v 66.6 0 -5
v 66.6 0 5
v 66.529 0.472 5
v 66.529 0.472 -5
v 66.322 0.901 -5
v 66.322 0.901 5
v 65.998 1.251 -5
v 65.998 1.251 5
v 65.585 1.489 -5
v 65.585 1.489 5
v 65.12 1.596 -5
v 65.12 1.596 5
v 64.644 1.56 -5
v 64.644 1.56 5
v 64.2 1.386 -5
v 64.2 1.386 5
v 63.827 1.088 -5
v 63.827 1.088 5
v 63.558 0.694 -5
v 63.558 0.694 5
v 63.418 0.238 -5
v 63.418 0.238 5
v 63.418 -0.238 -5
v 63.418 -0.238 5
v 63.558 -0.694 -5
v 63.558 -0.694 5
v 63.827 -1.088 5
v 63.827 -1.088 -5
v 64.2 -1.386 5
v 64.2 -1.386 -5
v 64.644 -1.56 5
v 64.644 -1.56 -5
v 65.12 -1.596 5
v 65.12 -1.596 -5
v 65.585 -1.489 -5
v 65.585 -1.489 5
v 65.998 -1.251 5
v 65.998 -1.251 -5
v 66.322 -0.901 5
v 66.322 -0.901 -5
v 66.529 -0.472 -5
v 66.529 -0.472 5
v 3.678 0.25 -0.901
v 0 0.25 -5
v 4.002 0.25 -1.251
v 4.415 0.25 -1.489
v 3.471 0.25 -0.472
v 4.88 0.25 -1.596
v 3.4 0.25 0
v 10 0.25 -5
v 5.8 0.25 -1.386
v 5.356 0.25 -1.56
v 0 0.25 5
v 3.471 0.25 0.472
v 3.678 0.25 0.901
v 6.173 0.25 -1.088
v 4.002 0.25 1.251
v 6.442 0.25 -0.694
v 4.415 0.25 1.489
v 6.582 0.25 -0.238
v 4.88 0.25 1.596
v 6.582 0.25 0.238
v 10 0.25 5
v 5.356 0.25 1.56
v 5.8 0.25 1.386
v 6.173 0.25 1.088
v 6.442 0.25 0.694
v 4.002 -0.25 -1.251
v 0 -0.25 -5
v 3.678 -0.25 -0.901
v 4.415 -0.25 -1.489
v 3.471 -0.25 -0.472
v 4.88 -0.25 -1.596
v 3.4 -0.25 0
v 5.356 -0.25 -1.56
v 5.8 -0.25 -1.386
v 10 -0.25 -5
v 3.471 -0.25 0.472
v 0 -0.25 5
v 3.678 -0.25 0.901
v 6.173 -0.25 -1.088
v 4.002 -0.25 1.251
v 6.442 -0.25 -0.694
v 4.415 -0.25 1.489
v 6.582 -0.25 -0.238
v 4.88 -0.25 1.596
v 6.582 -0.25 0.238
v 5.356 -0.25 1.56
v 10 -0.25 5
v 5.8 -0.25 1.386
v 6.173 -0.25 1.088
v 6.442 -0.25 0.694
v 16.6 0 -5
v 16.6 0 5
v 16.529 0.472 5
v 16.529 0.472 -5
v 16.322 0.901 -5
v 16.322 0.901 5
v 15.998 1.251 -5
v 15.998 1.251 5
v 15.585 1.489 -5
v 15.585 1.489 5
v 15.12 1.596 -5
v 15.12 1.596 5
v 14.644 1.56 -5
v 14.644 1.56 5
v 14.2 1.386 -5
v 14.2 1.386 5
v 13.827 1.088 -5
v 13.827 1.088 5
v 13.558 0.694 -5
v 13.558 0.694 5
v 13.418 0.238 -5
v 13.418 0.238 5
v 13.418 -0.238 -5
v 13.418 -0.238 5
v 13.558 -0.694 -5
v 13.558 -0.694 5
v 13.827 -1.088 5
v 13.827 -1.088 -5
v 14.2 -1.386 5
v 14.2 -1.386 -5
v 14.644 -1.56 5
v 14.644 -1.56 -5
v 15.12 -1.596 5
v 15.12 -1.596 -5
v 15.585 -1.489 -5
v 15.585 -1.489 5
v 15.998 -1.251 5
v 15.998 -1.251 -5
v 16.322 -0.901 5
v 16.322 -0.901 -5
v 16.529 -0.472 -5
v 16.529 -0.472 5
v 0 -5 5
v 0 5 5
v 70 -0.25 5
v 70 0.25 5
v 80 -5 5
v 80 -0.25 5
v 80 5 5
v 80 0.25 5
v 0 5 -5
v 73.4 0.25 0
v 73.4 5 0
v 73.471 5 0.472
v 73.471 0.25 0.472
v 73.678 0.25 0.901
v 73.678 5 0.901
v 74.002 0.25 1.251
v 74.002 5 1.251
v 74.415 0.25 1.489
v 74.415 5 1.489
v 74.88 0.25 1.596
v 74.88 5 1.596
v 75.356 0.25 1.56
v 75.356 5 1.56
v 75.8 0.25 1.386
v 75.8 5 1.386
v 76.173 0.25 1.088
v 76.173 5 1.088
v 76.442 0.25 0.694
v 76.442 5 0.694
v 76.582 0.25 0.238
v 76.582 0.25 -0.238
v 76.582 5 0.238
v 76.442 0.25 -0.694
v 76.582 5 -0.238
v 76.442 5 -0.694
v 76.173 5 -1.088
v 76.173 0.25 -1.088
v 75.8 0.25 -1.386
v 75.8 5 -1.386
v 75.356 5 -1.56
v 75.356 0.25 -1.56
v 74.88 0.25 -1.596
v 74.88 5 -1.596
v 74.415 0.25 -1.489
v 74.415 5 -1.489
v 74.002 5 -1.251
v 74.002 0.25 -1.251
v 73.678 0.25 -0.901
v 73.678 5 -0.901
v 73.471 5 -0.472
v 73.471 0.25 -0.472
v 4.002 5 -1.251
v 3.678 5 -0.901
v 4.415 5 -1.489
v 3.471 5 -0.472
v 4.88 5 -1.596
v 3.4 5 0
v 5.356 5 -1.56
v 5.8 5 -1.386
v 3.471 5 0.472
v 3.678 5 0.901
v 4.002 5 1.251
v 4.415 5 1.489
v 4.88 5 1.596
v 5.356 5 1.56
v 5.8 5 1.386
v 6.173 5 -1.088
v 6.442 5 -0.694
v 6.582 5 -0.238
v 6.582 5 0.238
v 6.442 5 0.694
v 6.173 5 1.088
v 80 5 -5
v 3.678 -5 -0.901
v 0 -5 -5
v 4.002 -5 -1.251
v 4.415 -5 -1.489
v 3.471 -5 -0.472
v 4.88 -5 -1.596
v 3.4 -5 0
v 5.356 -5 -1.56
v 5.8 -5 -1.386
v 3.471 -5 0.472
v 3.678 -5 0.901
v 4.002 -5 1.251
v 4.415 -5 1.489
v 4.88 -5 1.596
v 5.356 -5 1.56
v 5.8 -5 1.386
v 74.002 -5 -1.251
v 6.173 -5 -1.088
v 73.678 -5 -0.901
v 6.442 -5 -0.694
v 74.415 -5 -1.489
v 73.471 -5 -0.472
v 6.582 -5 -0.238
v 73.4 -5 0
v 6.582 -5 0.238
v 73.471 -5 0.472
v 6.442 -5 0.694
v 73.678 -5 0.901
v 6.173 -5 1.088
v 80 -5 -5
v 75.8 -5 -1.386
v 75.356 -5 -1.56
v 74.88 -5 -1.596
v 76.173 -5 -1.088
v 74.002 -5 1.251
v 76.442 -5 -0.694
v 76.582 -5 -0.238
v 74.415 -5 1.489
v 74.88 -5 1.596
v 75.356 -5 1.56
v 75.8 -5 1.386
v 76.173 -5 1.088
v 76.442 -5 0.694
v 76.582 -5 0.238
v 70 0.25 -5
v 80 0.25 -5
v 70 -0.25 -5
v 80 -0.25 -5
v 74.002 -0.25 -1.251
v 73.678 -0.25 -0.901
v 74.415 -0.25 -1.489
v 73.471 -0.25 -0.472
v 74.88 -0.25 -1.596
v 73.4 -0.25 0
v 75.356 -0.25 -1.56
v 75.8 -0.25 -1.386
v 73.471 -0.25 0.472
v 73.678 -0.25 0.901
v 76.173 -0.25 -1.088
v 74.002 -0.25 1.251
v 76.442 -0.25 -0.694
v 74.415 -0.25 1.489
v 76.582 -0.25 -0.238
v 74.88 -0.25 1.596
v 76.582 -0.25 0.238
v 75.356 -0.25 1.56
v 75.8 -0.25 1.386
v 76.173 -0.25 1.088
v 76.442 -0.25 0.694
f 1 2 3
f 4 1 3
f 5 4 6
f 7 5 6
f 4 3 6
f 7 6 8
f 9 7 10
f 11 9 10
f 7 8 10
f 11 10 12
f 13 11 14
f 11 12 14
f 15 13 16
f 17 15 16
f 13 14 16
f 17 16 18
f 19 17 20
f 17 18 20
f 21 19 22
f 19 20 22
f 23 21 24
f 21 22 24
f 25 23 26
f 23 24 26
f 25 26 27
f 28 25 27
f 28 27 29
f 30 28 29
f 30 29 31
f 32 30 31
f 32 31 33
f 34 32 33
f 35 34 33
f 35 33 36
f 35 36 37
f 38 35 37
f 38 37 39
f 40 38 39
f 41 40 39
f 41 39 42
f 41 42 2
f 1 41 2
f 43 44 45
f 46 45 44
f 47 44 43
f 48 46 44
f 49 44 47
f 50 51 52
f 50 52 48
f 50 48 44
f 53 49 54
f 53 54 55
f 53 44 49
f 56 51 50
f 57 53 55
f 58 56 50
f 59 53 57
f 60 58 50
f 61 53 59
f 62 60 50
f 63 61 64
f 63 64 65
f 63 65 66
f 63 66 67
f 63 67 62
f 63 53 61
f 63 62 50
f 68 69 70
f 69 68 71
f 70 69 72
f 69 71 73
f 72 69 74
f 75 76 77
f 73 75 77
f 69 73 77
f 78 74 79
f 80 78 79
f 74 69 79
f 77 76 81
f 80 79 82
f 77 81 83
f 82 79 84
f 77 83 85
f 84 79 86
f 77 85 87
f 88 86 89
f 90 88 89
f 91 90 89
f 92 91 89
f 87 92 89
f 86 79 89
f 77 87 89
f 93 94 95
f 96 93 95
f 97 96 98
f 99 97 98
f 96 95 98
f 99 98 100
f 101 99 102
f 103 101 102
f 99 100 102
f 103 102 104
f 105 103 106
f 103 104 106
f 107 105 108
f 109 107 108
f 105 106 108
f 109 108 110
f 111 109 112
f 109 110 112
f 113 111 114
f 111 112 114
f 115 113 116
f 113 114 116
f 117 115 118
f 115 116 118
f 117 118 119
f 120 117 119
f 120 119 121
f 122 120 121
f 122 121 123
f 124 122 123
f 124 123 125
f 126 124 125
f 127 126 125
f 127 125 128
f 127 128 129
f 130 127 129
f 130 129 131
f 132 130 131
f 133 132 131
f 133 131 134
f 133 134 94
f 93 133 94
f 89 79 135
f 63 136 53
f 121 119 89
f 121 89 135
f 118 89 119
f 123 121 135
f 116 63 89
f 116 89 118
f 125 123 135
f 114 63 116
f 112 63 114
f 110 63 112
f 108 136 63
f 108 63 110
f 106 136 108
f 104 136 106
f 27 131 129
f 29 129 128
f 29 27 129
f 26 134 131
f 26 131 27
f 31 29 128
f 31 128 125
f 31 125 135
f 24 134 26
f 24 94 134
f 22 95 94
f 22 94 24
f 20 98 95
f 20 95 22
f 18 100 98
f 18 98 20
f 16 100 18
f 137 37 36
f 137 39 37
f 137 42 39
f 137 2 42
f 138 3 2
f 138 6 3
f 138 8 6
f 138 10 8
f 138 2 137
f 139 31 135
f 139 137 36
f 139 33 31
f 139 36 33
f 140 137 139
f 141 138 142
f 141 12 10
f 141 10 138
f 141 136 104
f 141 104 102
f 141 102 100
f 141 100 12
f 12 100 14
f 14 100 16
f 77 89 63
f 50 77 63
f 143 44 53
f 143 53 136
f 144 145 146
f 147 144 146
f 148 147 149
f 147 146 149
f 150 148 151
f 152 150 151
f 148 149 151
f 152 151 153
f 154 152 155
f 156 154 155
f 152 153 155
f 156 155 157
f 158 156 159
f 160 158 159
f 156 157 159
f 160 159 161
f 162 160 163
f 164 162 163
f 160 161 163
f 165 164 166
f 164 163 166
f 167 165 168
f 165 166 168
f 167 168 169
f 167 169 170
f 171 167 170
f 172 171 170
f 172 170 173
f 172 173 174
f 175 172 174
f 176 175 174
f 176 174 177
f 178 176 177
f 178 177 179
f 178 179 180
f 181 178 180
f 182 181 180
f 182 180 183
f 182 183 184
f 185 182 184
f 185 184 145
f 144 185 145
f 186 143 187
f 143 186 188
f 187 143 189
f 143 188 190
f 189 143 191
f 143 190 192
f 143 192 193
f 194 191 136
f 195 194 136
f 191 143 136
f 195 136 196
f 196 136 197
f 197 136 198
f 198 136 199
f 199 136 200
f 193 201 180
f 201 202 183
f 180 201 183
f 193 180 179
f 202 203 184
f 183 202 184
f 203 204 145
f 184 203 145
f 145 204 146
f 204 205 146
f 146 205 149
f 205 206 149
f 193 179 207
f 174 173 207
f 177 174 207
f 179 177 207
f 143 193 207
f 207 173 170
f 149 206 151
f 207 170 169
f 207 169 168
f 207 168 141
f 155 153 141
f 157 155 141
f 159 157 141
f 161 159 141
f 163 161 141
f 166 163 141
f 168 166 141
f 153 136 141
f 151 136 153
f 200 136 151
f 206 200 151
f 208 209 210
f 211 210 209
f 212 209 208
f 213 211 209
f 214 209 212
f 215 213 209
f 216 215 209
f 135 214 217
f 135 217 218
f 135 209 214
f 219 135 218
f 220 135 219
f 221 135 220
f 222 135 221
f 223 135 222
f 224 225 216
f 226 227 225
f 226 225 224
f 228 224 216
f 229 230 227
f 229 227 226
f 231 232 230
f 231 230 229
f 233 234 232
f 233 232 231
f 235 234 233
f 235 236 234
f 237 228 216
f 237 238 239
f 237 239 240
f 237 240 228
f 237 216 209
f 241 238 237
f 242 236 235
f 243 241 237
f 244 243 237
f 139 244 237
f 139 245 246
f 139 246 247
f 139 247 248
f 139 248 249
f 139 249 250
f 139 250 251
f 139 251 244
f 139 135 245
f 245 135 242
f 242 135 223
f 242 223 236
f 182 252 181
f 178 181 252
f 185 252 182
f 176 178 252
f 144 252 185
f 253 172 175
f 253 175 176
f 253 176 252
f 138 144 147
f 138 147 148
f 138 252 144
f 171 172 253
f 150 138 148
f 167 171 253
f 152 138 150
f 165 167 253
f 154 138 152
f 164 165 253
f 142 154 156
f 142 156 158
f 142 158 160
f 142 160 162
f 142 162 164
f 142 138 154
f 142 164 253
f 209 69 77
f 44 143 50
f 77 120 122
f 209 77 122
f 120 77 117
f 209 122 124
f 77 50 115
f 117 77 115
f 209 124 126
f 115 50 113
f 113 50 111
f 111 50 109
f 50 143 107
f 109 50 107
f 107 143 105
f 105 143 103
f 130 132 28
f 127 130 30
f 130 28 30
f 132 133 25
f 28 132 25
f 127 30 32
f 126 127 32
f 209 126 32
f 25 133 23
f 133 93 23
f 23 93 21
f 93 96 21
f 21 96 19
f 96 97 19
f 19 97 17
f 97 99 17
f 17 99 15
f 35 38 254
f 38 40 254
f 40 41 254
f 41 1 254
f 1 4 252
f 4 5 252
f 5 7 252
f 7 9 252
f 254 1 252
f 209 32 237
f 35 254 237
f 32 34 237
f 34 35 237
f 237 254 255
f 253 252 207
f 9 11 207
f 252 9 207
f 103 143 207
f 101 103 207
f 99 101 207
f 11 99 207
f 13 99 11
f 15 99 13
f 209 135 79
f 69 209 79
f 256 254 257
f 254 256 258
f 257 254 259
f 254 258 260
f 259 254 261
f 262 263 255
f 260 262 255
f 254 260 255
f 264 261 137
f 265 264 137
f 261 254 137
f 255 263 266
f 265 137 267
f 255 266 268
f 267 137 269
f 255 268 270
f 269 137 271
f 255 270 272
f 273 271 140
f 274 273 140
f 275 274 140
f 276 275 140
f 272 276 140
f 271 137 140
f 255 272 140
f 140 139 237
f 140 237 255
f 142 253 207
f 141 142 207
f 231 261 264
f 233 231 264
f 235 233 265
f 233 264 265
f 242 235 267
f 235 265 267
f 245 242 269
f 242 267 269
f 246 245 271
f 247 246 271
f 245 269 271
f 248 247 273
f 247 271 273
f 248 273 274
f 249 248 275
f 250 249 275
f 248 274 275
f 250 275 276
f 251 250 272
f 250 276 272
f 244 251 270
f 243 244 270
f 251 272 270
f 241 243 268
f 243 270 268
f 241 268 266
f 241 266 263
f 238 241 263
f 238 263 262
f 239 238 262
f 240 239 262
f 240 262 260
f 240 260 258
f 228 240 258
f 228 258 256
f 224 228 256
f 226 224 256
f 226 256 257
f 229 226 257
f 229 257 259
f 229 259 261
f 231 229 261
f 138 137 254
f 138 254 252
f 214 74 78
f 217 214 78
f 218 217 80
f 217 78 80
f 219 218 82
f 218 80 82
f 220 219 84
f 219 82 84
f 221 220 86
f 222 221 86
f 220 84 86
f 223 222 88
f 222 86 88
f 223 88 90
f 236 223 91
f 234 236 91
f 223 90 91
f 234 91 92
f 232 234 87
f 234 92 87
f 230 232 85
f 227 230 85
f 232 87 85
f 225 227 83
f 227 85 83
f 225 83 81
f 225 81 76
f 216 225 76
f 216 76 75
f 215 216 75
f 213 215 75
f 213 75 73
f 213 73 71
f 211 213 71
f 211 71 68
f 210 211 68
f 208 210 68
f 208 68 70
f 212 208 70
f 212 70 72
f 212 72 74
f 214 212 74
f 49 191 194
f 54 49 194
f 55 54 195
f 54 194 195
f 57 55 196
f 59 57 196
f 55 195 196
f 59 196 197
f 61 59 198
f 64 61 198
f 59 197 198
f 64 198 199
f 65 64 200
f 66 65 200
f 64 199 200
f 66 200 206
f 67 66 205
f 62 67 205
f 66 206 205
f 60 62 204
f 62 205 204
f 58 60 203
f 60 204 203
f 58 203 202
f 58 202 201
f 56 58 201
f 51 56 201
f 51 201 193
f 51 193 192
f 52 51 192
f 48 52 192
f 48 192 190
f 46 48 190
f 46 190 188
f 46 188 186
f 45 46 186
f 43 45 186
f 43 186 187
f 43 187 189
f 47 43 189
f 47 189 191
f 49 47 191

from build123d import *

# Parameters (mm, degrees)
SKETCH1_W           = 80
SKETCH1_H           = 10
BOSS_EXTRUDE1_DEPTH = 5
SKETCH2_W           = 10
SKETCH2_H           = 0.5
CUT_EXTRUDE1_DEPTH  = 81.777472107
SKETCH3_R           = 1.6
CUT_EXTRUDE2_DEPTH  = 81.777472107
SKETCH5_R           = 1.6
CUT_EXTRUDE3_DEPTH  = 81.777472107


with BuildPart() as part:
    # Sketch1 → Boss-Extrude1 (new, symmetric)
    with BuildSketch(Plane.XY):
        with Locations((40, 0)):
            Rectangle(SKETCH1_W, SKETCH1_H)
    extrude(amount=BOSS_EXTRUDE1_DEPTH, both=True)

    # Sketch2 → Cut-Extrude1 (cut, through all)
    with BuildSketch(Plane.XY.offset(5)):
        with Locations((5, 0)):
            Rectangle(SKETCH2_W, SKETCH2_H)
        with Locations((75, 0)):
            Rectangle(SKETCH2_W, SKETCH2_H)
    extrude(amount=-CUT_EXTRUDE1_DEPTH, mode=Mode.SUBTRACT)

    # Sketch3 → Cut-Extrude2 (cut, through all)
    with BuildSketch(Plane(origin=(0, 5, 0), x_dir=(1, 0, 0), z_dir=(0, 1, 0))):
        with Locations(Location((5, 0, 0), (0, 0, 180))):
            Circle(SKETCH3_R)
        with Locations(Location((75, 0, 0), (0, 0, 180))):
            Circle(SKETCH3_R)
    extrude(amount=-CUT_EXTRUDE2_DEPTH, mode=Mode.SUBTRACT)

    # Sketch5 → Cut-Extrude3 (cut, through all)
    with BuildSketch(Plane.XY.offset(5)):
        with Locations((15, 0)):
            Circle(SKETCH5_R)
        with Locations((65, 0)):
            Circle(SKETCH5_R)
    extrude(amount=-CUT_EXTRUDE3_DEPTH, mode=Mode.SUBTRACT)


solid = part.part
